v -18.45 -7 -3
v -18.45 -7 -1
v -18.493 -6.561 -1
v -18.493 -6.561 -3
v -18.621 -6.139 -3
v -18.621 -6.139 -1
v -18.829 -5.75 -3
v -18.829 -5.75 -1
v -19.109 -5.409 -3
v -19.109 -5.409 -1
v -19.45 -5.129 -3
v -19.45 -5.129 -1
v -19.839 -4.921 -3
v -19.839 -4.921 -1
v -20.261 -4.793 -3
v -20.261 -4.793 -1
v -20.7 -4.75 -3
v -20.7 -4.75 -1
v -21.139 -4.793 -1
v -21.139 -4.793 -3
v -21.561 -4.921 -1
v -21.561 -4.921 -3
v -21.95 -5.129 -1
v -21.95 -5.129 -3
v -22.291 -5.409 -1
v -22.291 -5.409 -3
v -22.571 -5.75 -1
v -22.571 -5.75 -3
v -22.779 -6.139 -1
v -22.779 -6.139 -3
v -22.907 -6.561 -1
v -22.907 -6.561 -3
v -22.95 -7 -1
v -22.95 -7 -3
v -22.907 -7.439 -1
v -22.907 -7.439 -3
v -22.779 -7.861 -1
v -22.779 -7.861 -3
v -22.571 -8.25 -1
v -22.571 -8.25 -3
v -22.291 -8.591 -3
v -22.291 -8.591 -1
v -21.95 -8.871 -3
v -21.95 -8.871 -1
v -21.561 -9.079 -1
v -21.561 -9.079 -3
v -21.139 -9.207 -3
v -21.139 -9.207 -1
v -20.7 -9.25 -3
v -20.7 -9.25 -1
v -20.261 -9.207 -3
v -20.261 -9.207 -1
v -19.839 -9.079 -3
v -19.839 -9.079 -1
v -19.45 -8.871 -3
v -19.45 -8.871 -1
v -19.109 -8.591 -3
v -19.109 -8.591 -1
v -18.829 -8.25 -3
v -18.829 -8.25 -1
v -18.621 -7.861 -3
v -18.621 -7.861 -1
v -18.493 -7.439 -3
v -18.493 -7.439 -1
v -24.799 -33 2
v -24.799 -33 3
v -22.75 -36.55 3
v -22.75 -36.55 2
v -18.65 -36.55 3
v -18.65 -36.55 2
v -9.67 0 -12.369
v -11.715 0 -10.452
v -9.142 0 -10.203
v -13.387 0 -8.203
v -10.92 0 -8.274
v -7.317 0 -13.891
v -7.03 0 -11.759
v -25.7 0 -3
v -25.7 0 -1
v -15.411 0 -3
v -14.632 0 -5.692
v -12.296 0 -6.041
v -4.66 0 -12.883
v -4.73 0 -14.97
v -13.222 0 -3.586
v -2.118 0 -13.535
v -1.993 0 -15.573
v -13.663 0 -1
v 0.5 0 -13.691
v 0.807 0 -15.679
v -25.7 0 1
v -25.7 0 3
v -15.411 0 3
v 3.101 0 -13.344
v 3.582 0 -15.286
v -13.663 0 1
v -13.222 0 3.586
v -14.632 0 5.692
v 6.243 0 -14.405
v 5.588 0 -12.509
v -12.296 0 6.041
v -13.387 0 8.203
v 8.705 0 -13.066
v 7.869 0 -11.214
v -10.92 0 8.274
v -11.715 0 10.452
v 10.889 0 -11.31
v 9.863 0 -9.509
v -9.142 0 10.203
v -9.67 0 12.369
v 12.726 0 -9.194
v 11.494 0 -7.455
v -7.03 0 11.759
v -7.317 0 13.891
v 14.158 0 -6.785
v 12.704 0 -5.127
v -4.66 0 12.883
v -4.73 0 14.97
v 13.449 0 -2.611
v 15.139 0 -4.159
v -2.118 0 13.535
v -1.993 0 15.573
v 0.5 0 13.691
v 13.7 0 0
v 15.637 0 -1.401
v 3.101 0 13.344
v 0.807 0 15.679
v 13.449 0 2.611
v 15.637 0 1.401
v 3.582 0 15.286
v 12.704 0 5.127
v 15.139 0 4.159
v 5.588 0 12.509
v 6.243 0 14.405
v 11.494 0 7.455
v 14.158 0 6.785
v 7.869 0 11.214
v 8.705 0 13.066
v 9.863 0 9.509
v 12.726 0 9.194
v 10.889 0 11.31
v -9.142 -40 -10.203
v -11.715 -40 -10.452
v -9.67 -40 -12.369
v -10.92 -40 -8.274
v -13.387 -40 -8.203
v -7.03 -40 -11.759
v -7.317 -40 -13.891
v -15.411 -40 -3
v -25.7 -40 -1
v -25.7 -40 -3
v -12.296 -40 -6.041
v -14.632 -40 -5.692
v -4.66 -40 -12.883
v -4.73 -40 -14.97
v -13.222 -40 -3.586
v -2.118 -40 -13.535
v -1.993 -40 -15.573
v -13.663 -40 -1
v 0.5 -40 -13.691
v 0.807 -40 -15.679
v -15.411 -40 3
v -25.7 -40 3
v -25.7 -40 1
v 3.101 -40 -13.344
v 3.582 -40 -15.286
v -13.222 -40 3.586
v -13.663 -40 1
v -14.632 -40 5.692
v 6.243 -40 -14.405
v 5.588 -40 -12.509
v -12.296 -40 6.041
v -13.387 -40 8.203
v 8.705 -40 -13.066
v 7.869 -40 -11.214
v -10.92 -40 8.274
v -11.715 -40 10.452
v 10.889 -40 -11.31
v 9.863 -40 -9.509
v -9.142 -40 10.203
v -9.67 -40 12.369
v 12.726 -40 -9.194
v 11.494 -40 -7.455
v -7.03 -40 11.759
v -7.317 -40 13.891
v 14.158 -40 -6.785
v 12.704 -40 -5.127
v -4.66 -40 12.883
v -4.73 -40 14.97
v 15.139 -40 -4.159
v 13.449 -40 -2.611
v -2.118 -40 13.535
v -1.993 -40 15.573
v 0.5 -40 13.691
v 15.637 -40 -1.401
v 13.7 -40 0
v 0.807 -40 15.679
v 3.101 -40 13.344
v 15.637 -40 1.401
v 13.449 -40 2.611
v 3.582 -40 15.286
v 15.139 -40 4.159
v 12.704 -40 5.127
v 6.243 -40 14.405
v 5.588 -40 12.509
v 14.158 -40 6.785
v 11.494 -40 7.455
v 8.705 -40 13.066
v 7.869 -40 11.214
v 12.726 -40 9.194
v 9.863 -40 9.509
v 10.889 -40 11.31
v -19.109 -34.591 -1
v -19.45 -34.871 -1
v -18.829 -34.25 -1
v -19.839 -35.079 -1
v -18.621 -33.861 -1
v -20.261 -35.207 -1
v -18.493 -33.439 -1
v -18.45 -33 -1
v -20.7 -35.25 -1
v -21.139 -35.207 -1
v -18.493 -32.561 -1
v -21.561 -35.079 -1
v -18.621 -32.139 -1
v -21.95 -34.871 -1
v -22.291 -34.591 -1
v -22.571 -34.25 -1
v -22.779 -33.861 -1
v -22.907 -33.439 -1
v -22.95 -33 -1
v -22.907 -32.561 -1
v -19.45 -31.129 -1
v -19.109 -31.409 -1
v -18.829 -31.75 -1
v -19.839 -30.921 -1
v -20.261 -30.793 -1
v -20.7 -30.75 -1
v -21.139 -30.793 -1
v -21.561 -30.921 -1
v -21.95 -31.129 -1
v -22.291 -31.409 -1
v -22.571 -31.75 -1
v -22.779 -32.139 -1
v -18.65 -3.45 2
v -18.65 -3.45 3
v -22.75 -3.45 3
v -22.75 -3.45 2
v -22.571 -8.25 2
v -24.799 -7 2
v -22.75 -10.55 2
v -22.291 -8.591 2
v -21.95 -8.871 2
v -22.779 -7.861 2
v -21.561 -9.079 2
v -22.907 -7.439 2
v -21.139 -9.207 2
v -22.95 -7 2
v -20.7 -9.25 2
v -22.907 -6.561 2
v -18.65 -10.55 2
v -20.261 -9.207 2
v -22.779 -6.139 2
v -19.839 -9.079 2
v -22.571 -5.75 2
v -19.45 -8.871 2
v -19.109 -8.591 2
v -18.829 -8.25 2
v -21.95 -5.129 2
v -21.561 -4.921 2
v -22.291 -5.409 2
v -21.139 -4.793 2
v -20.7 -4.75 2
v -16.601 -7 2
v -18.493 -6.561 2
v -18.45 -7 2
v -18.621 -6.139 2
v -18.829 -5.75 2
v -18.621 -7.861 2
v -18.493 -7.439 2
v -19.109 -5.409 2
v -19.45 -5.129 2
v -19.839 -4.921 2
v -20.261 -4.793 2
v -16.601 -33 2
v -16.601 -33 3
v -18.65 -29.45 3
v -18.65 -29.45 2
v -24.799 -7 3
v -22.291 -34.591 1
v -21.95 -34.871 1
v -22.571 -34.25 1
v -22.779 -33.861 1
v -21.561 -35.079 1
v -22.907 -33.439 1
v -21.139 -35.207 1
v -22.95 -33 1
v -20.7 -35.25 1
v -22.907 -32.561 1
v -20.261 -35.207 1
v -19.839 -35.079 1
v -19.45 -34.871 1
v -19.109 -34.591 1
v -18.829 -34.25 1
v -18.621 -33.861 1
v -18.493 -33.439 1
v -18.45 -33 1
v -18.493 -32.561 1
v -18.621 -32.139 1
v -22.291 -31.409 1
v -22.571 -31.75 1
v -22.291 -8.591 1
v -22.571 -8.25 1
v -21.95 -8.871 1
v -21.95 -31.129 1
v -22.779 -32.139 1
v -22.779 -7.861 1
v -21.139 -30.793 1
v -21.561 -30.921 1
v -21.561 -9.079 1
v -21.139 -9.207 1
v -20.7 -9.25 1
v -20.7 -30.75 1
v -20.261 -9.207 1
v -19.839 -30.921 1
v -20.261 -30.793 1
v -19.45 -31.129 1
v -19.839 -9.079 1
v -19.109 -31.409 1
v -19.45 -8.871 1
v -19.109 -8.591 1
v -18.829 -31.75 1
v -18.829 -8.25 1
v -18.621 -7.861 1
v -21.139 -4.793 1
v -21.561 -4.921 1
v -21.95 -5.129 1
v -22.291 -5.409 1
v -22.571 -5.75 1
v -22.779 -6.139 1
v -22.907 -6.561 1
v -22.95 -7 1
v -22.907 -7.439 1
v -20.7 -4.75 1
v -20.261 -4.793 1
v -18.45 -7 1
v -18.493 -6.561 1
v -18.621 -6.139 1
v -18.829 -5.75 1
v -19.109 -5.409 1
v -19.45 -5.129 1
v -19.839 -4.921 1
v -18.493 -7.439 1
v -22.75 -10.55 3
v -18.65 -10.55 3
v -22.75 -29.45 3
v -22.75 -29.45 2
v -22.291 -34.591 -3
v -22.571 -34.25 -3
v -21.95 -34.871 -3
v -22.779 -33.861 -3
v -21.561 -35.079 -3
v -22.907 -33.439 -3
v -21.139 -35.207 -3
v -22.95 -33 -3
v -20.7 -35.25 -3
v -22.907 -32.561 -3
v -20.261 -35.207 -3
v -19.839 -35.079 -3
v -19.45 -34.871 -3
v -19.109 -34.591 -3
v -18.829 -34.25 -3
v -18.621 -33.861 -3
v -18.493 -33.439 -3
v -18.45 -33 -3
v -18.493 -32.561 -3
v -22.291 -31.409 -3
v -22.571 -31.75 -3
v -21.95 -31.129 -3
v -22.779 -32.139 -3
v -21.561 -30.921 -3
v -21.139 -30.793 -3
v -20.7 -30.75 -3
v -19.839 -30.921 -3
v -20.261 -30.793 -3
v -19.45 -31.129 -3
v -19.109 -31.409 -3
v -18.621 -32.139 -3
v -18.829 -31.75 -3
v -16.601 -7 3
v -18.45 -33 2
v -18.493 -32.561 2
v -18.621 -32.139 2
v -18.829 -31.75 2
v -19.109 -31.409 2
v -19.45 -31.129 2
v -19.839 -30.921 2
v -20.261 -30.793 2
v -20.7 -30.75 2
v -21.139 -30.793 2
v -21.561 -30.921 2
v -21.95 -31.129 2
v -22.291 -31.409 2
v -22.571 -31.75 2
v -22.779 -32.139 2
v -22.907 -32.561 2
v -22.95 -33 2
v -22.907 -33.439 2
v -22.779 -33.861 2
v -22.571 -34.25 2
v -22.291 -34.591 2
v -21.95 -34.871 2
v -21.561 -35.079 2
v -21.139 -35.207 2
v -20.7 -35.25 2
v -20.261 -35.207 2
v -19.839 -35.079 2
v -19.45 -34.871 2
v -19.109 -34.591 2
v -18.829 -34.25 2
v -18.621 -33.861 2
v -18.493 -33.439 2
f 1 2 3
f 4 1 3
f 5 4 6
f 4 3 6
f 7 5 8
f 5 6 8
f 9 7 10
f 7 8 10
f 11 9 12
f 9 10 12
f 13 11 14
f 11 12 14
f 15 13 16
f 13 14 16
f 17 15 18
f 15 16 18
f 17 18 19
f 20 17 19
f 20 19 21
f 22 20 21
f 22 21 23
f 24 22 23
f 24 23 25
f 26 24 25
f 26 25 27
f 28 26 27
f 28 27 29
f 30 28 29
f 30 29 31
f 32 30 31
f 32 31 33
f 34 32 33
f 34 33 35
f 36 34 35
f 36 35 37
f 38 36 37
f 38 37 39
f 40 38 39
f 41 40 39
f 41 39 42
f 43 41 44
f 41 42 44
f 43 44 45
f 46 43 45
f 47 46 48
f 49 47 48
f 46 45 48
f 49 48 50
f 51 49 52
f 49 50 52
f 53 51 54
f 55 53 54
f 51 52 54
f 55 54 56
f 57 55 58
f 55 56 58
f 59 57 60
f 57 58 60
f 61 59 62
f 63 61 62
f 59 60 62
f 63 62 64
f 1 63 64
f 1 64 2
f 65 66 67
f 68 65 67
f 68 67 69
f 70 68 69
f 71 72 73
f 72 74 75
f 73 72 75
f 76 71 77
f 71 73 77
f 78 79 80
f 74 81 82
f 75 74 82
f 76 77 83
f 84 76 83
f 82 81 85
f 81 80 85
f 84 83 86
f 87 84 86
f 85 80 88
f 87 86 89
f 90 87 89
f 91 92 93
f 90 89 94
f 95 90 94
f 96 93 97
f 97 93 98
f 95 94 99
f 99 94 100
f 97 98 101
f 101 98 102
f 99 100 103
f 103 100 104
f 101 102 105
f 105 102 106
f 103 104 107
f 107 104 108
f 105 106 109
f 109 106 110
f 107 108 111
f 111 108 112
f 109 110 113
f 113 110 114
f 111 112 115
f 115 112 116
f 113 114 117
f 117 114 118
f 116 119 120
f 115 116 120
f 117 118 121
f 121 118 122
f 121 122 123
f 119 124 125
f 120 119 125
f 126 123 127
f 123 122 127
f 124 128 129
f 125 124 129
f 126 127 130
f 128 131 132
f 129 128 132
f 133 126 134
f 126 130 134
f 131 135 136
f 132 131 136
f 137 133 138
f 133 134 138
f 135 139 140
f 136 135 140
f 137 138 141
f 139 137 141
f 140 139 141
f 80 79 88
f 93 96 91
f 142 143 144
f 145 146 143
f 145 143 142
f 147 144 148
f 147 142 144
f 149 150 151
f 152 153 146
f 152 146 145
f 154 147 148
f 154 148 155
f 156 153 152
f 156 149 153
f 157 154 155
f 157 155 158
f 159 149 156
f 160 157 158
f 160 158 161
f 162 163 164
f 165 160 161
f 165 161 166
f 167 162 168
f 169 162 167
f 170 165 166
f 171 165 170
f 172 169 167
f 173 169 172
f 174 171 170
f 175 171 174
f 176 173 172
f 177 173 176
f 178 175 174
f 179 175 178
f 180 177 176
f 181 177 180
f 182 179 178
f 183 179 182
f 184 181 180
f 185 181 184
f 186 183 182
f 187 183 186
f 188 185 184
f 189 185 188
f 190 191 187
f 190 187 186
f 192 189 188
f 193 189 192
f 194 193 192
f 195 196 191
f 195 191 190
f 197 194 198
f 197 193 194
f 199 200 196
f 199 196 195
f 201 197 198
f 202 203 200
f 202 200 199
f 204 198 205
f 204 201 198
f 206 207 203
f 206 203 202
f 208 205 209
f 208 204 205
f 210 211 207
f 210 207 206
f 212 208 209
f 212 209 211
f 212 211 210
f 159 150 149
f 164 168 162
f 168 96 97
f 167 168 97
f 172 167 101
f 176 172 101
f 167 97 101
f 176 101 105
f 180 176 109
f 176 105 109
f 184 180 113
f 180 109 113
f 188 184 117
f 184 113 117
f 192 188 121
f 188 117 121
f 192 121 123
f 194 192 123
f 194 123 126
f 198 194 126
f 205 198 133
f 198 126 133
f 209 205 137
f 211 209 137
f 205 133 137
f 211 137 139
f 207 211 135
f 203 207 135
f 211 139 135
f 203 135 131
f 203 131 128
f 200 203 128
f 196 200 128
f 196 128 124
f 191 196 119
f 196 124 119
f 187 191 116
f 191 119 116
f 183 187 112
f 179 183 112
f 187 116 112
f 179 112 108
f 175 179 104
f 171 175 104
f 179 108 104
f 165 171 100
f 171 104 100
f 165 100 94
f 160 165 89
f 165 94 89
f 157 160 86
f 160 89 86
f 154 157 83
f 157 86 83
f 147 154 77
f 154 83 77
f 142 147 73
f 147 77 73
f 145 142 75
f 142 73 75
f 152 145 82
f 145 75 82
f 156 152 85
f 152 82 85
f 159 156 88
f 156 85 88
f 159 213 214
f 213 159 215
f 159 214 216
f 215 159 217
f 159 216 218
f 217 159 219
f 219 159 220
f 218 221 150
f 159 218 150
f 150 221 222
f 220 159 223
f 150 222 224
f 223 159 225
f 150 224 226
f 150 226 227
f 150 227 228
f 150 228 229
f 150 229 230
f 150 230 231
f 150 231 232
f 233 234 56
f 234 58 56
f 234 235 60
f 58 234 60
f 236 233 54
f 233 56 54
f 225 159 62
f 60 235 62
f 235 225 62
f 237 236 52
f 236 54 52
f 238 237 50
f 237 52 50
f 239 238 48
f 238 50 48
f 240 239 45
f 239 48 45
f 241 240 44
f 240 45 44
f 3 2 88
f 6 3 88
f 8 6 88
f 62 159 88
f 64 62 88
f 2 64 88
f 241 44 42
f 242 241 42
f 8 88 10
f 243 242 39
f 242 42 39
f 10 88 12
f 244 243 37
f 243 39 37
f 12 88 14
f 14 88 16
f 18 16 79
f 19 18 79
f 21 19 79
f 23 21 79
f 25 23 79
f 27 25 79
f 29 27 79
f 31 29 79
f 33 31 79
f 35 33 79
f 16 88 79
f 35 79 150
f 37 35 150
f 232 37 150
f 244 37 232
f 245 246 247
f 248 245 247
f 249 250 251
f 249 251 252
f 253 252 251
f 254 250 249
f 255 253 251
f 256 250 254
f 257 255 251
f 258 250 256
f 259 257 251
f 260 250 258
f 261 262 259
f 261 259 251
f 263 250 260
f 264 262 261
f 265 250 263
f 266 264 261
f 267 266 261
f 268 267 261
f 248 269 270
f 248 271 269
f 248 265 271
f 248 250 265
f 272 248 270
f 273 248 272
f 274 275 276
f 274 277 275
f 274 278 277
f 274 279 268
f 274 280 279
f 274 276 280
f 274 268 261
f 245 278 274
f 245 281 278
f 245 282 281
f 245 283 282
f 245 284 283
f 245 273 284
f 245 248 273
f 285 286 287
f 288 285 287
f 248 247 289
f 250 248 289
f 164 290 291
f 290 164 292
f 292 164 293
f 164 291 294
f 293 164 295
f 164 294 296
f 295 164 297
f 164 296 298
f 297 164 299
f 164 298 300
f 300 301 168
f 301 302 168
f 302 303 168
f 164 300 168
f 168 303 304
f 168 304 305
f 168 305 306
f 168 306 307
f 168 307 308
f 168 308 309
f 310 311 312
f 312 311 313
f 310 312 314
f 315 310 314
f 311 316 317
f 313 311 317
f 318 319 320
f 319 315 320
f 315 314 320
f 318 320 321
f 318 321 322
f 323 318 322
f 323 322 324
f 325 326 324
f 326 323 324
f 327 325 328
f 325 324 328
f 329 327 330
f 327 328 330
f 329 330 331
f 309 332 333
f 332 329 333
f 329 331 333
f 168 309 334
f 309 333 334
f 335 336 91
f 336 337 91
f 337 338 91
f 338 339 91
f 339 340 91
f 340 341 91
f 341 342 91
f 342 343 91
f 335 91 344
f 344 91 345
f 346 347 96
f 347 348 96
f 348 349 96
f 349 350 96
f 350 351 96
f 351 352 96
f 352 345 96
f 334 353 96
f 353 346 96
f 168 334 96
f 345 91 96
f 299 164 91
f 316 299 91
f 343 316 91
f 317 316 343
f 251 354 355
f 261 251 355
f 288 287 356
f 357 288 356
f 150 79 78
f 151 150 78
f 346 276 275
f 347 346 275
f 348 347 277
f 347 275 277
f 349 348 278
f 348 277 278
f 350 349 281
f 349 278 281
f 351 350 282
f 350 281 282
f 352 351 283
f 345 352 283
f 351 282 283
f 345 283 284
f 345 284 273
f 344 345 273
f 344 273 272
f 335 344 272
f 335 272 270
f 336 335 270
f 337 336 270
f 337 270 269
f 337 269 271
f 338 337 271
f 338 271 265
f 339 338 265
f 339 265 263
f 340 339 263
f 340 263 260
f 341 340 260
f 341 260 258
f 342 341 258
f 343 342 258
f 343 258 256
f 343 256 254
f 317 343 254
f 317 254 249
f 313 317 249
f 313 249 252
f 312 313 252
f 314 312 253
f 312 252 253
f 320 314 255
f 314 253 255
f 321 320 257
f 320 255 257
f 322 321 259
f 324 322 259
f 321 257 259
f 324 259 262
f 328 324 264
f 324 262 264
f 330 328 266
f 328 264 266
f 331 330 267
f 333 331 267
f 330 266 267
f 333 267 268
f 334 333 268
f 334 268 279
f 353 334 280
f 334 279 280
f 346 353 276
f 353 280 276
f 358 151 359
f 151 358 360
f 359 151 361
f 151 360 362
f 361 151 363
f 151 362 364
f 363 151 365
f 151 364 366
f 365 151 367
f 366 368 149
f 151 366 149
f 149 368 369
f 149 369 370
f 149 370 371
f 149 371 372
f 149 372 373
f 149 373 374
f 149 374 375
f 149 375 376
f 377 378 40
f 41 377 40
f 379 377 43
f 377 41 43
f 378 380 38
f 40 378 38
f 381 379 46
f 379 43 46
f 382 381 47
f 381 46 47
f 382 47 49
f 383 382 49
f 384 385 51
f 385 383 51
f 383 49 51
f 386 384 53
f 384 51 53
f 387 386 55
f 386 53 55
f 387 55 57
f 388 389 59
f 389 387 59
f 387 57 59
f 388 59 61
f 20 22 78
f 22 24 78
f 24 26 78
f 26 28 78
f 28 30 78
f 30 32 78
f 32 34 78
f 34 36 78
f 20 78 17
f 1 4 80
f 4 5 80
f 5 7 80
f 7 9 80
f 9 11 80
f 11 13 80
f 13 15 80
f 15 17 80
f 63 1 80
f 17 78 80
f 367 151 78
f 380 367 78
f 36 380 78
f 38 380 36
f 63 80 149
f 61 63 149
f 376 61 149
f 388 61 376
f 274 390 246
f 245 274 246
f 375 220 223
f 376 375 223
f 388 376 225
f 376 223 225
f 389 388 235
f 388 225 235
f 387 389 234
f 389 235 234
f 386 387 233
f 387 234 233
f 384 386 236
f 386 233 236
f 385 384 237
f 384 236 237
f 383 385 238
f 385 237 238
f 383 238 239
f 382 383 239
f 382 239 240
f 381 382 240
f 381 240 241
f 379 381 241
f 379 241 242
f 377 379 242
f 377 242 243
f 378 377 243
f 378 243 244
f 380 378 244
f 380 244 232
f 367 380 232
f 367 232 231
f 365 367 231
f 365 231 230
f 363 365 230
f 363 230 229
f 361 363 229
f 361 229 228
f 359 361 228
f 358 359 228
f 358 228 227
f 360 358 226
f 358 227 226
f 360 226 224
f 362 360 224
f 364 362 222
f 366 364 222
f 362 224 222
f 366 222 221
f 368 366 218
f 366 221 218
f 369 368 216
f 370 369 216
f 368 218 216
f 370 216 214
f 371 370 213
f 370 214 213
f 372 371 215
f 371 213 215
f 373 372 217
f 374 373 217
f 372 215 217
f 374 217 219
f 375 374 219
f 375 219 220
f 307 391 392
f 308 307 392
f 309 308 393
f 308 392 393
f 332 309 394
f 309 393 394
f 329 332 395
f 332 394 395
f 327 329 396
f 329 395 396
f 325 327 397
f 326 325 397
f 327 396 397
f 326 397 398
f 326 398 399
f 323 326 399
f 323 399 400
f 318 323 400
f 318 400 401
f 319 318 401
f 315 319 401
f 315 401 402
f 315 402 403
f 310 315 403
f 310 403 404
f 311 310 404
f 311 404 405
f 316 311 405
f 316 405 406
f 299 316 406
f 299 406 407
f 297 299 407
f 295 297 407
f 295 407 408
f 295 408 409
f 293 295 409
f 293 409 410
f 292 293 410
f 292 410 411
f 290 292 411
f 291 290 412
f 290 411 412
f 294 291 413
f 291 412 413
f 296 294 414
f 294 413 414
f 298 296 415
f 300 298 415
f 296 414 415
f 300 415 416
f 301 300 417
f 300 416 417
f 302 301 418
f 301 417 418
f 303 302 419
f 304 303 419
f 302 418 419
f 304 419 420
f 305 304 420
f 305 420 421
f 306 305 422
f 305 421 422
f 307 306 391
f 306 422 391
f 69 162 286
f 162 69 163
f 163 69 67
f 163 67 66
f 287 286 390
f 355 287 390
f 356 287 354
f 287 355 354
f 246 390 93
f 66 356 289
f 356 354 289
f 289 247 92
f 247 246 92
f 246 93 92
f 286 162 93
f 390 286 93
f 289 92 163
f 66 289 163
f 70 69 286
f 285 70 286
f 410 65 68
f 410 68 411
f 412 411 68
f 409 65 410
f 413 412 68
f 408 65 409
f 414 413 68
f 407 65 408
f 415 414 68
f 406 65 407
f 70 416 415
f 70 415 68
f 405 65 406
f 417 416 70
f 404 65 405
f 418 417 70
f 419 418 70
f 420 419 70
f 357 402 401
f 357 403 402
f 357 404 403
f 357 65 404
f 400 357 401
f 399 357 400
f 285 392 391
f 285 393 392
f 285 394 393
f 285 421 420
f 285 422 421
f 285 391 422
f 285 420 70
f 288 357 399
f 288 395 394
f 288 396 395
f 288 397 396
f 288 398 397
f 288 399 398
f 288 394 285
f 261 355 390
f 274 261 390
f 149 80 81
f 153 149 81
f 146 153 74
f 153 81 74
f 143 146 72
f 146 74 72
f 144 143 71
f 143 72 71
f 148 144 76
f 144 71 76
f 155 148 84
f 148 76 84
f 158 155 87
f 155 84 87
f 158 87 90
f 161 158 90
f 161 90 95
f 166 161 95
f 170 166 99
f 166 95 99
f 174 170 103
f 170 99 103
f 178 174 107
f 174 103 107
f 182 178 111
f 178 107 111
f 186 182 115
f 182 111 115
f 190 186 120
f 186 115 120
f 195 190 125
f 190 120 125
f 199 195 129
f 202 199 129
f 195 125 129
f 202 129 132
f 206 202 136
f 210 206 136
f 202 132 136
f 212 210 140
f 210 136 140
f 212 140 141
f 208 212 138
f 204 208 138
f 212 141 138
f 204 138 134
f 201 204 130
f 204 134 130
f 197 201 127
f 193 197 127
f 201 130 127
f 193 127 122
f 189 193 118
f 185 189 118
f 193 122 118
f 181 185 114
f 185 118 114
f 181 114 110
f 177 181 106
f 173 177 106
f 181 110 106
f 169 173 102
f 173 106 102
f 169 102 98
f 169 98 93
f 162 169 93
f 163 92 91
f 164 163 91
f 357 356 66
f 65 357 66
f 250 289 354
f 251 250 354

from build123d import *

# Parameters (mm, degrees)
F1_DEPTH = 40
F3_DEPTH = 1
F4_R     = 2.25
F5_DEPTH = 18.701


with BuildPart() as f1:
    # F0 (on Front) → F1 (new body)
    with BuildSketch(Plane.XZ):
        with BuildLine():
            ThreePointArc((-13.663455, 1), (13.7, 0), (-13.663455, -1))
            Line((-13.663455, -1), (-25.7, -1))
            Line((-25.7, -1), (-25.7, -3))
            Line((-25.7, -3), (-15.410711, -3))
            ThreePointArc((-15.410711, -3), (15.7, 0), (-15.410711, 3))
            Line((-15.410711, 3), (-25.7, 3))
            Line((-25.7, 3), (-25.7, 1))
            Line((-25.7, 1), (-13.663455, 1))
        make_face()
    extrude(amount=F1_DEPTH)

    # F2 (on face) → F3 (cut)
    with BuildSketch(Plane.XY.offset(3)):
        Polygon((-16.600813, -33), (-18.650407, -29.45), (-22.749593, -29.45), (-24.799187, -33), (-22.749593, -36.55), (-18.650407, -36.55), align=None)
        Polygon((-24.799187, -7), (-22.749593, -10.55), (-18.650407, -10.55), (-16.600813, -7), (-18.650407, -3.45), (-22.749593, -3.45), align=None)
    extrude(amount=-F3_DEPTH, mode=Mode.SUBTRACT)

    # F4 (on face) → F5 (cut, through all)
    with BuildSketch(Plane.XY.offset(3)):
        with Locations((-20.7, -33)):
            Circle(F4_R)
        with Locations((-20.7, -7)):
            Circle(F4_R)
    extrude(amount=-F5_DEPTH, mode=Mode.SUBTRACT)


solid = f1.part
